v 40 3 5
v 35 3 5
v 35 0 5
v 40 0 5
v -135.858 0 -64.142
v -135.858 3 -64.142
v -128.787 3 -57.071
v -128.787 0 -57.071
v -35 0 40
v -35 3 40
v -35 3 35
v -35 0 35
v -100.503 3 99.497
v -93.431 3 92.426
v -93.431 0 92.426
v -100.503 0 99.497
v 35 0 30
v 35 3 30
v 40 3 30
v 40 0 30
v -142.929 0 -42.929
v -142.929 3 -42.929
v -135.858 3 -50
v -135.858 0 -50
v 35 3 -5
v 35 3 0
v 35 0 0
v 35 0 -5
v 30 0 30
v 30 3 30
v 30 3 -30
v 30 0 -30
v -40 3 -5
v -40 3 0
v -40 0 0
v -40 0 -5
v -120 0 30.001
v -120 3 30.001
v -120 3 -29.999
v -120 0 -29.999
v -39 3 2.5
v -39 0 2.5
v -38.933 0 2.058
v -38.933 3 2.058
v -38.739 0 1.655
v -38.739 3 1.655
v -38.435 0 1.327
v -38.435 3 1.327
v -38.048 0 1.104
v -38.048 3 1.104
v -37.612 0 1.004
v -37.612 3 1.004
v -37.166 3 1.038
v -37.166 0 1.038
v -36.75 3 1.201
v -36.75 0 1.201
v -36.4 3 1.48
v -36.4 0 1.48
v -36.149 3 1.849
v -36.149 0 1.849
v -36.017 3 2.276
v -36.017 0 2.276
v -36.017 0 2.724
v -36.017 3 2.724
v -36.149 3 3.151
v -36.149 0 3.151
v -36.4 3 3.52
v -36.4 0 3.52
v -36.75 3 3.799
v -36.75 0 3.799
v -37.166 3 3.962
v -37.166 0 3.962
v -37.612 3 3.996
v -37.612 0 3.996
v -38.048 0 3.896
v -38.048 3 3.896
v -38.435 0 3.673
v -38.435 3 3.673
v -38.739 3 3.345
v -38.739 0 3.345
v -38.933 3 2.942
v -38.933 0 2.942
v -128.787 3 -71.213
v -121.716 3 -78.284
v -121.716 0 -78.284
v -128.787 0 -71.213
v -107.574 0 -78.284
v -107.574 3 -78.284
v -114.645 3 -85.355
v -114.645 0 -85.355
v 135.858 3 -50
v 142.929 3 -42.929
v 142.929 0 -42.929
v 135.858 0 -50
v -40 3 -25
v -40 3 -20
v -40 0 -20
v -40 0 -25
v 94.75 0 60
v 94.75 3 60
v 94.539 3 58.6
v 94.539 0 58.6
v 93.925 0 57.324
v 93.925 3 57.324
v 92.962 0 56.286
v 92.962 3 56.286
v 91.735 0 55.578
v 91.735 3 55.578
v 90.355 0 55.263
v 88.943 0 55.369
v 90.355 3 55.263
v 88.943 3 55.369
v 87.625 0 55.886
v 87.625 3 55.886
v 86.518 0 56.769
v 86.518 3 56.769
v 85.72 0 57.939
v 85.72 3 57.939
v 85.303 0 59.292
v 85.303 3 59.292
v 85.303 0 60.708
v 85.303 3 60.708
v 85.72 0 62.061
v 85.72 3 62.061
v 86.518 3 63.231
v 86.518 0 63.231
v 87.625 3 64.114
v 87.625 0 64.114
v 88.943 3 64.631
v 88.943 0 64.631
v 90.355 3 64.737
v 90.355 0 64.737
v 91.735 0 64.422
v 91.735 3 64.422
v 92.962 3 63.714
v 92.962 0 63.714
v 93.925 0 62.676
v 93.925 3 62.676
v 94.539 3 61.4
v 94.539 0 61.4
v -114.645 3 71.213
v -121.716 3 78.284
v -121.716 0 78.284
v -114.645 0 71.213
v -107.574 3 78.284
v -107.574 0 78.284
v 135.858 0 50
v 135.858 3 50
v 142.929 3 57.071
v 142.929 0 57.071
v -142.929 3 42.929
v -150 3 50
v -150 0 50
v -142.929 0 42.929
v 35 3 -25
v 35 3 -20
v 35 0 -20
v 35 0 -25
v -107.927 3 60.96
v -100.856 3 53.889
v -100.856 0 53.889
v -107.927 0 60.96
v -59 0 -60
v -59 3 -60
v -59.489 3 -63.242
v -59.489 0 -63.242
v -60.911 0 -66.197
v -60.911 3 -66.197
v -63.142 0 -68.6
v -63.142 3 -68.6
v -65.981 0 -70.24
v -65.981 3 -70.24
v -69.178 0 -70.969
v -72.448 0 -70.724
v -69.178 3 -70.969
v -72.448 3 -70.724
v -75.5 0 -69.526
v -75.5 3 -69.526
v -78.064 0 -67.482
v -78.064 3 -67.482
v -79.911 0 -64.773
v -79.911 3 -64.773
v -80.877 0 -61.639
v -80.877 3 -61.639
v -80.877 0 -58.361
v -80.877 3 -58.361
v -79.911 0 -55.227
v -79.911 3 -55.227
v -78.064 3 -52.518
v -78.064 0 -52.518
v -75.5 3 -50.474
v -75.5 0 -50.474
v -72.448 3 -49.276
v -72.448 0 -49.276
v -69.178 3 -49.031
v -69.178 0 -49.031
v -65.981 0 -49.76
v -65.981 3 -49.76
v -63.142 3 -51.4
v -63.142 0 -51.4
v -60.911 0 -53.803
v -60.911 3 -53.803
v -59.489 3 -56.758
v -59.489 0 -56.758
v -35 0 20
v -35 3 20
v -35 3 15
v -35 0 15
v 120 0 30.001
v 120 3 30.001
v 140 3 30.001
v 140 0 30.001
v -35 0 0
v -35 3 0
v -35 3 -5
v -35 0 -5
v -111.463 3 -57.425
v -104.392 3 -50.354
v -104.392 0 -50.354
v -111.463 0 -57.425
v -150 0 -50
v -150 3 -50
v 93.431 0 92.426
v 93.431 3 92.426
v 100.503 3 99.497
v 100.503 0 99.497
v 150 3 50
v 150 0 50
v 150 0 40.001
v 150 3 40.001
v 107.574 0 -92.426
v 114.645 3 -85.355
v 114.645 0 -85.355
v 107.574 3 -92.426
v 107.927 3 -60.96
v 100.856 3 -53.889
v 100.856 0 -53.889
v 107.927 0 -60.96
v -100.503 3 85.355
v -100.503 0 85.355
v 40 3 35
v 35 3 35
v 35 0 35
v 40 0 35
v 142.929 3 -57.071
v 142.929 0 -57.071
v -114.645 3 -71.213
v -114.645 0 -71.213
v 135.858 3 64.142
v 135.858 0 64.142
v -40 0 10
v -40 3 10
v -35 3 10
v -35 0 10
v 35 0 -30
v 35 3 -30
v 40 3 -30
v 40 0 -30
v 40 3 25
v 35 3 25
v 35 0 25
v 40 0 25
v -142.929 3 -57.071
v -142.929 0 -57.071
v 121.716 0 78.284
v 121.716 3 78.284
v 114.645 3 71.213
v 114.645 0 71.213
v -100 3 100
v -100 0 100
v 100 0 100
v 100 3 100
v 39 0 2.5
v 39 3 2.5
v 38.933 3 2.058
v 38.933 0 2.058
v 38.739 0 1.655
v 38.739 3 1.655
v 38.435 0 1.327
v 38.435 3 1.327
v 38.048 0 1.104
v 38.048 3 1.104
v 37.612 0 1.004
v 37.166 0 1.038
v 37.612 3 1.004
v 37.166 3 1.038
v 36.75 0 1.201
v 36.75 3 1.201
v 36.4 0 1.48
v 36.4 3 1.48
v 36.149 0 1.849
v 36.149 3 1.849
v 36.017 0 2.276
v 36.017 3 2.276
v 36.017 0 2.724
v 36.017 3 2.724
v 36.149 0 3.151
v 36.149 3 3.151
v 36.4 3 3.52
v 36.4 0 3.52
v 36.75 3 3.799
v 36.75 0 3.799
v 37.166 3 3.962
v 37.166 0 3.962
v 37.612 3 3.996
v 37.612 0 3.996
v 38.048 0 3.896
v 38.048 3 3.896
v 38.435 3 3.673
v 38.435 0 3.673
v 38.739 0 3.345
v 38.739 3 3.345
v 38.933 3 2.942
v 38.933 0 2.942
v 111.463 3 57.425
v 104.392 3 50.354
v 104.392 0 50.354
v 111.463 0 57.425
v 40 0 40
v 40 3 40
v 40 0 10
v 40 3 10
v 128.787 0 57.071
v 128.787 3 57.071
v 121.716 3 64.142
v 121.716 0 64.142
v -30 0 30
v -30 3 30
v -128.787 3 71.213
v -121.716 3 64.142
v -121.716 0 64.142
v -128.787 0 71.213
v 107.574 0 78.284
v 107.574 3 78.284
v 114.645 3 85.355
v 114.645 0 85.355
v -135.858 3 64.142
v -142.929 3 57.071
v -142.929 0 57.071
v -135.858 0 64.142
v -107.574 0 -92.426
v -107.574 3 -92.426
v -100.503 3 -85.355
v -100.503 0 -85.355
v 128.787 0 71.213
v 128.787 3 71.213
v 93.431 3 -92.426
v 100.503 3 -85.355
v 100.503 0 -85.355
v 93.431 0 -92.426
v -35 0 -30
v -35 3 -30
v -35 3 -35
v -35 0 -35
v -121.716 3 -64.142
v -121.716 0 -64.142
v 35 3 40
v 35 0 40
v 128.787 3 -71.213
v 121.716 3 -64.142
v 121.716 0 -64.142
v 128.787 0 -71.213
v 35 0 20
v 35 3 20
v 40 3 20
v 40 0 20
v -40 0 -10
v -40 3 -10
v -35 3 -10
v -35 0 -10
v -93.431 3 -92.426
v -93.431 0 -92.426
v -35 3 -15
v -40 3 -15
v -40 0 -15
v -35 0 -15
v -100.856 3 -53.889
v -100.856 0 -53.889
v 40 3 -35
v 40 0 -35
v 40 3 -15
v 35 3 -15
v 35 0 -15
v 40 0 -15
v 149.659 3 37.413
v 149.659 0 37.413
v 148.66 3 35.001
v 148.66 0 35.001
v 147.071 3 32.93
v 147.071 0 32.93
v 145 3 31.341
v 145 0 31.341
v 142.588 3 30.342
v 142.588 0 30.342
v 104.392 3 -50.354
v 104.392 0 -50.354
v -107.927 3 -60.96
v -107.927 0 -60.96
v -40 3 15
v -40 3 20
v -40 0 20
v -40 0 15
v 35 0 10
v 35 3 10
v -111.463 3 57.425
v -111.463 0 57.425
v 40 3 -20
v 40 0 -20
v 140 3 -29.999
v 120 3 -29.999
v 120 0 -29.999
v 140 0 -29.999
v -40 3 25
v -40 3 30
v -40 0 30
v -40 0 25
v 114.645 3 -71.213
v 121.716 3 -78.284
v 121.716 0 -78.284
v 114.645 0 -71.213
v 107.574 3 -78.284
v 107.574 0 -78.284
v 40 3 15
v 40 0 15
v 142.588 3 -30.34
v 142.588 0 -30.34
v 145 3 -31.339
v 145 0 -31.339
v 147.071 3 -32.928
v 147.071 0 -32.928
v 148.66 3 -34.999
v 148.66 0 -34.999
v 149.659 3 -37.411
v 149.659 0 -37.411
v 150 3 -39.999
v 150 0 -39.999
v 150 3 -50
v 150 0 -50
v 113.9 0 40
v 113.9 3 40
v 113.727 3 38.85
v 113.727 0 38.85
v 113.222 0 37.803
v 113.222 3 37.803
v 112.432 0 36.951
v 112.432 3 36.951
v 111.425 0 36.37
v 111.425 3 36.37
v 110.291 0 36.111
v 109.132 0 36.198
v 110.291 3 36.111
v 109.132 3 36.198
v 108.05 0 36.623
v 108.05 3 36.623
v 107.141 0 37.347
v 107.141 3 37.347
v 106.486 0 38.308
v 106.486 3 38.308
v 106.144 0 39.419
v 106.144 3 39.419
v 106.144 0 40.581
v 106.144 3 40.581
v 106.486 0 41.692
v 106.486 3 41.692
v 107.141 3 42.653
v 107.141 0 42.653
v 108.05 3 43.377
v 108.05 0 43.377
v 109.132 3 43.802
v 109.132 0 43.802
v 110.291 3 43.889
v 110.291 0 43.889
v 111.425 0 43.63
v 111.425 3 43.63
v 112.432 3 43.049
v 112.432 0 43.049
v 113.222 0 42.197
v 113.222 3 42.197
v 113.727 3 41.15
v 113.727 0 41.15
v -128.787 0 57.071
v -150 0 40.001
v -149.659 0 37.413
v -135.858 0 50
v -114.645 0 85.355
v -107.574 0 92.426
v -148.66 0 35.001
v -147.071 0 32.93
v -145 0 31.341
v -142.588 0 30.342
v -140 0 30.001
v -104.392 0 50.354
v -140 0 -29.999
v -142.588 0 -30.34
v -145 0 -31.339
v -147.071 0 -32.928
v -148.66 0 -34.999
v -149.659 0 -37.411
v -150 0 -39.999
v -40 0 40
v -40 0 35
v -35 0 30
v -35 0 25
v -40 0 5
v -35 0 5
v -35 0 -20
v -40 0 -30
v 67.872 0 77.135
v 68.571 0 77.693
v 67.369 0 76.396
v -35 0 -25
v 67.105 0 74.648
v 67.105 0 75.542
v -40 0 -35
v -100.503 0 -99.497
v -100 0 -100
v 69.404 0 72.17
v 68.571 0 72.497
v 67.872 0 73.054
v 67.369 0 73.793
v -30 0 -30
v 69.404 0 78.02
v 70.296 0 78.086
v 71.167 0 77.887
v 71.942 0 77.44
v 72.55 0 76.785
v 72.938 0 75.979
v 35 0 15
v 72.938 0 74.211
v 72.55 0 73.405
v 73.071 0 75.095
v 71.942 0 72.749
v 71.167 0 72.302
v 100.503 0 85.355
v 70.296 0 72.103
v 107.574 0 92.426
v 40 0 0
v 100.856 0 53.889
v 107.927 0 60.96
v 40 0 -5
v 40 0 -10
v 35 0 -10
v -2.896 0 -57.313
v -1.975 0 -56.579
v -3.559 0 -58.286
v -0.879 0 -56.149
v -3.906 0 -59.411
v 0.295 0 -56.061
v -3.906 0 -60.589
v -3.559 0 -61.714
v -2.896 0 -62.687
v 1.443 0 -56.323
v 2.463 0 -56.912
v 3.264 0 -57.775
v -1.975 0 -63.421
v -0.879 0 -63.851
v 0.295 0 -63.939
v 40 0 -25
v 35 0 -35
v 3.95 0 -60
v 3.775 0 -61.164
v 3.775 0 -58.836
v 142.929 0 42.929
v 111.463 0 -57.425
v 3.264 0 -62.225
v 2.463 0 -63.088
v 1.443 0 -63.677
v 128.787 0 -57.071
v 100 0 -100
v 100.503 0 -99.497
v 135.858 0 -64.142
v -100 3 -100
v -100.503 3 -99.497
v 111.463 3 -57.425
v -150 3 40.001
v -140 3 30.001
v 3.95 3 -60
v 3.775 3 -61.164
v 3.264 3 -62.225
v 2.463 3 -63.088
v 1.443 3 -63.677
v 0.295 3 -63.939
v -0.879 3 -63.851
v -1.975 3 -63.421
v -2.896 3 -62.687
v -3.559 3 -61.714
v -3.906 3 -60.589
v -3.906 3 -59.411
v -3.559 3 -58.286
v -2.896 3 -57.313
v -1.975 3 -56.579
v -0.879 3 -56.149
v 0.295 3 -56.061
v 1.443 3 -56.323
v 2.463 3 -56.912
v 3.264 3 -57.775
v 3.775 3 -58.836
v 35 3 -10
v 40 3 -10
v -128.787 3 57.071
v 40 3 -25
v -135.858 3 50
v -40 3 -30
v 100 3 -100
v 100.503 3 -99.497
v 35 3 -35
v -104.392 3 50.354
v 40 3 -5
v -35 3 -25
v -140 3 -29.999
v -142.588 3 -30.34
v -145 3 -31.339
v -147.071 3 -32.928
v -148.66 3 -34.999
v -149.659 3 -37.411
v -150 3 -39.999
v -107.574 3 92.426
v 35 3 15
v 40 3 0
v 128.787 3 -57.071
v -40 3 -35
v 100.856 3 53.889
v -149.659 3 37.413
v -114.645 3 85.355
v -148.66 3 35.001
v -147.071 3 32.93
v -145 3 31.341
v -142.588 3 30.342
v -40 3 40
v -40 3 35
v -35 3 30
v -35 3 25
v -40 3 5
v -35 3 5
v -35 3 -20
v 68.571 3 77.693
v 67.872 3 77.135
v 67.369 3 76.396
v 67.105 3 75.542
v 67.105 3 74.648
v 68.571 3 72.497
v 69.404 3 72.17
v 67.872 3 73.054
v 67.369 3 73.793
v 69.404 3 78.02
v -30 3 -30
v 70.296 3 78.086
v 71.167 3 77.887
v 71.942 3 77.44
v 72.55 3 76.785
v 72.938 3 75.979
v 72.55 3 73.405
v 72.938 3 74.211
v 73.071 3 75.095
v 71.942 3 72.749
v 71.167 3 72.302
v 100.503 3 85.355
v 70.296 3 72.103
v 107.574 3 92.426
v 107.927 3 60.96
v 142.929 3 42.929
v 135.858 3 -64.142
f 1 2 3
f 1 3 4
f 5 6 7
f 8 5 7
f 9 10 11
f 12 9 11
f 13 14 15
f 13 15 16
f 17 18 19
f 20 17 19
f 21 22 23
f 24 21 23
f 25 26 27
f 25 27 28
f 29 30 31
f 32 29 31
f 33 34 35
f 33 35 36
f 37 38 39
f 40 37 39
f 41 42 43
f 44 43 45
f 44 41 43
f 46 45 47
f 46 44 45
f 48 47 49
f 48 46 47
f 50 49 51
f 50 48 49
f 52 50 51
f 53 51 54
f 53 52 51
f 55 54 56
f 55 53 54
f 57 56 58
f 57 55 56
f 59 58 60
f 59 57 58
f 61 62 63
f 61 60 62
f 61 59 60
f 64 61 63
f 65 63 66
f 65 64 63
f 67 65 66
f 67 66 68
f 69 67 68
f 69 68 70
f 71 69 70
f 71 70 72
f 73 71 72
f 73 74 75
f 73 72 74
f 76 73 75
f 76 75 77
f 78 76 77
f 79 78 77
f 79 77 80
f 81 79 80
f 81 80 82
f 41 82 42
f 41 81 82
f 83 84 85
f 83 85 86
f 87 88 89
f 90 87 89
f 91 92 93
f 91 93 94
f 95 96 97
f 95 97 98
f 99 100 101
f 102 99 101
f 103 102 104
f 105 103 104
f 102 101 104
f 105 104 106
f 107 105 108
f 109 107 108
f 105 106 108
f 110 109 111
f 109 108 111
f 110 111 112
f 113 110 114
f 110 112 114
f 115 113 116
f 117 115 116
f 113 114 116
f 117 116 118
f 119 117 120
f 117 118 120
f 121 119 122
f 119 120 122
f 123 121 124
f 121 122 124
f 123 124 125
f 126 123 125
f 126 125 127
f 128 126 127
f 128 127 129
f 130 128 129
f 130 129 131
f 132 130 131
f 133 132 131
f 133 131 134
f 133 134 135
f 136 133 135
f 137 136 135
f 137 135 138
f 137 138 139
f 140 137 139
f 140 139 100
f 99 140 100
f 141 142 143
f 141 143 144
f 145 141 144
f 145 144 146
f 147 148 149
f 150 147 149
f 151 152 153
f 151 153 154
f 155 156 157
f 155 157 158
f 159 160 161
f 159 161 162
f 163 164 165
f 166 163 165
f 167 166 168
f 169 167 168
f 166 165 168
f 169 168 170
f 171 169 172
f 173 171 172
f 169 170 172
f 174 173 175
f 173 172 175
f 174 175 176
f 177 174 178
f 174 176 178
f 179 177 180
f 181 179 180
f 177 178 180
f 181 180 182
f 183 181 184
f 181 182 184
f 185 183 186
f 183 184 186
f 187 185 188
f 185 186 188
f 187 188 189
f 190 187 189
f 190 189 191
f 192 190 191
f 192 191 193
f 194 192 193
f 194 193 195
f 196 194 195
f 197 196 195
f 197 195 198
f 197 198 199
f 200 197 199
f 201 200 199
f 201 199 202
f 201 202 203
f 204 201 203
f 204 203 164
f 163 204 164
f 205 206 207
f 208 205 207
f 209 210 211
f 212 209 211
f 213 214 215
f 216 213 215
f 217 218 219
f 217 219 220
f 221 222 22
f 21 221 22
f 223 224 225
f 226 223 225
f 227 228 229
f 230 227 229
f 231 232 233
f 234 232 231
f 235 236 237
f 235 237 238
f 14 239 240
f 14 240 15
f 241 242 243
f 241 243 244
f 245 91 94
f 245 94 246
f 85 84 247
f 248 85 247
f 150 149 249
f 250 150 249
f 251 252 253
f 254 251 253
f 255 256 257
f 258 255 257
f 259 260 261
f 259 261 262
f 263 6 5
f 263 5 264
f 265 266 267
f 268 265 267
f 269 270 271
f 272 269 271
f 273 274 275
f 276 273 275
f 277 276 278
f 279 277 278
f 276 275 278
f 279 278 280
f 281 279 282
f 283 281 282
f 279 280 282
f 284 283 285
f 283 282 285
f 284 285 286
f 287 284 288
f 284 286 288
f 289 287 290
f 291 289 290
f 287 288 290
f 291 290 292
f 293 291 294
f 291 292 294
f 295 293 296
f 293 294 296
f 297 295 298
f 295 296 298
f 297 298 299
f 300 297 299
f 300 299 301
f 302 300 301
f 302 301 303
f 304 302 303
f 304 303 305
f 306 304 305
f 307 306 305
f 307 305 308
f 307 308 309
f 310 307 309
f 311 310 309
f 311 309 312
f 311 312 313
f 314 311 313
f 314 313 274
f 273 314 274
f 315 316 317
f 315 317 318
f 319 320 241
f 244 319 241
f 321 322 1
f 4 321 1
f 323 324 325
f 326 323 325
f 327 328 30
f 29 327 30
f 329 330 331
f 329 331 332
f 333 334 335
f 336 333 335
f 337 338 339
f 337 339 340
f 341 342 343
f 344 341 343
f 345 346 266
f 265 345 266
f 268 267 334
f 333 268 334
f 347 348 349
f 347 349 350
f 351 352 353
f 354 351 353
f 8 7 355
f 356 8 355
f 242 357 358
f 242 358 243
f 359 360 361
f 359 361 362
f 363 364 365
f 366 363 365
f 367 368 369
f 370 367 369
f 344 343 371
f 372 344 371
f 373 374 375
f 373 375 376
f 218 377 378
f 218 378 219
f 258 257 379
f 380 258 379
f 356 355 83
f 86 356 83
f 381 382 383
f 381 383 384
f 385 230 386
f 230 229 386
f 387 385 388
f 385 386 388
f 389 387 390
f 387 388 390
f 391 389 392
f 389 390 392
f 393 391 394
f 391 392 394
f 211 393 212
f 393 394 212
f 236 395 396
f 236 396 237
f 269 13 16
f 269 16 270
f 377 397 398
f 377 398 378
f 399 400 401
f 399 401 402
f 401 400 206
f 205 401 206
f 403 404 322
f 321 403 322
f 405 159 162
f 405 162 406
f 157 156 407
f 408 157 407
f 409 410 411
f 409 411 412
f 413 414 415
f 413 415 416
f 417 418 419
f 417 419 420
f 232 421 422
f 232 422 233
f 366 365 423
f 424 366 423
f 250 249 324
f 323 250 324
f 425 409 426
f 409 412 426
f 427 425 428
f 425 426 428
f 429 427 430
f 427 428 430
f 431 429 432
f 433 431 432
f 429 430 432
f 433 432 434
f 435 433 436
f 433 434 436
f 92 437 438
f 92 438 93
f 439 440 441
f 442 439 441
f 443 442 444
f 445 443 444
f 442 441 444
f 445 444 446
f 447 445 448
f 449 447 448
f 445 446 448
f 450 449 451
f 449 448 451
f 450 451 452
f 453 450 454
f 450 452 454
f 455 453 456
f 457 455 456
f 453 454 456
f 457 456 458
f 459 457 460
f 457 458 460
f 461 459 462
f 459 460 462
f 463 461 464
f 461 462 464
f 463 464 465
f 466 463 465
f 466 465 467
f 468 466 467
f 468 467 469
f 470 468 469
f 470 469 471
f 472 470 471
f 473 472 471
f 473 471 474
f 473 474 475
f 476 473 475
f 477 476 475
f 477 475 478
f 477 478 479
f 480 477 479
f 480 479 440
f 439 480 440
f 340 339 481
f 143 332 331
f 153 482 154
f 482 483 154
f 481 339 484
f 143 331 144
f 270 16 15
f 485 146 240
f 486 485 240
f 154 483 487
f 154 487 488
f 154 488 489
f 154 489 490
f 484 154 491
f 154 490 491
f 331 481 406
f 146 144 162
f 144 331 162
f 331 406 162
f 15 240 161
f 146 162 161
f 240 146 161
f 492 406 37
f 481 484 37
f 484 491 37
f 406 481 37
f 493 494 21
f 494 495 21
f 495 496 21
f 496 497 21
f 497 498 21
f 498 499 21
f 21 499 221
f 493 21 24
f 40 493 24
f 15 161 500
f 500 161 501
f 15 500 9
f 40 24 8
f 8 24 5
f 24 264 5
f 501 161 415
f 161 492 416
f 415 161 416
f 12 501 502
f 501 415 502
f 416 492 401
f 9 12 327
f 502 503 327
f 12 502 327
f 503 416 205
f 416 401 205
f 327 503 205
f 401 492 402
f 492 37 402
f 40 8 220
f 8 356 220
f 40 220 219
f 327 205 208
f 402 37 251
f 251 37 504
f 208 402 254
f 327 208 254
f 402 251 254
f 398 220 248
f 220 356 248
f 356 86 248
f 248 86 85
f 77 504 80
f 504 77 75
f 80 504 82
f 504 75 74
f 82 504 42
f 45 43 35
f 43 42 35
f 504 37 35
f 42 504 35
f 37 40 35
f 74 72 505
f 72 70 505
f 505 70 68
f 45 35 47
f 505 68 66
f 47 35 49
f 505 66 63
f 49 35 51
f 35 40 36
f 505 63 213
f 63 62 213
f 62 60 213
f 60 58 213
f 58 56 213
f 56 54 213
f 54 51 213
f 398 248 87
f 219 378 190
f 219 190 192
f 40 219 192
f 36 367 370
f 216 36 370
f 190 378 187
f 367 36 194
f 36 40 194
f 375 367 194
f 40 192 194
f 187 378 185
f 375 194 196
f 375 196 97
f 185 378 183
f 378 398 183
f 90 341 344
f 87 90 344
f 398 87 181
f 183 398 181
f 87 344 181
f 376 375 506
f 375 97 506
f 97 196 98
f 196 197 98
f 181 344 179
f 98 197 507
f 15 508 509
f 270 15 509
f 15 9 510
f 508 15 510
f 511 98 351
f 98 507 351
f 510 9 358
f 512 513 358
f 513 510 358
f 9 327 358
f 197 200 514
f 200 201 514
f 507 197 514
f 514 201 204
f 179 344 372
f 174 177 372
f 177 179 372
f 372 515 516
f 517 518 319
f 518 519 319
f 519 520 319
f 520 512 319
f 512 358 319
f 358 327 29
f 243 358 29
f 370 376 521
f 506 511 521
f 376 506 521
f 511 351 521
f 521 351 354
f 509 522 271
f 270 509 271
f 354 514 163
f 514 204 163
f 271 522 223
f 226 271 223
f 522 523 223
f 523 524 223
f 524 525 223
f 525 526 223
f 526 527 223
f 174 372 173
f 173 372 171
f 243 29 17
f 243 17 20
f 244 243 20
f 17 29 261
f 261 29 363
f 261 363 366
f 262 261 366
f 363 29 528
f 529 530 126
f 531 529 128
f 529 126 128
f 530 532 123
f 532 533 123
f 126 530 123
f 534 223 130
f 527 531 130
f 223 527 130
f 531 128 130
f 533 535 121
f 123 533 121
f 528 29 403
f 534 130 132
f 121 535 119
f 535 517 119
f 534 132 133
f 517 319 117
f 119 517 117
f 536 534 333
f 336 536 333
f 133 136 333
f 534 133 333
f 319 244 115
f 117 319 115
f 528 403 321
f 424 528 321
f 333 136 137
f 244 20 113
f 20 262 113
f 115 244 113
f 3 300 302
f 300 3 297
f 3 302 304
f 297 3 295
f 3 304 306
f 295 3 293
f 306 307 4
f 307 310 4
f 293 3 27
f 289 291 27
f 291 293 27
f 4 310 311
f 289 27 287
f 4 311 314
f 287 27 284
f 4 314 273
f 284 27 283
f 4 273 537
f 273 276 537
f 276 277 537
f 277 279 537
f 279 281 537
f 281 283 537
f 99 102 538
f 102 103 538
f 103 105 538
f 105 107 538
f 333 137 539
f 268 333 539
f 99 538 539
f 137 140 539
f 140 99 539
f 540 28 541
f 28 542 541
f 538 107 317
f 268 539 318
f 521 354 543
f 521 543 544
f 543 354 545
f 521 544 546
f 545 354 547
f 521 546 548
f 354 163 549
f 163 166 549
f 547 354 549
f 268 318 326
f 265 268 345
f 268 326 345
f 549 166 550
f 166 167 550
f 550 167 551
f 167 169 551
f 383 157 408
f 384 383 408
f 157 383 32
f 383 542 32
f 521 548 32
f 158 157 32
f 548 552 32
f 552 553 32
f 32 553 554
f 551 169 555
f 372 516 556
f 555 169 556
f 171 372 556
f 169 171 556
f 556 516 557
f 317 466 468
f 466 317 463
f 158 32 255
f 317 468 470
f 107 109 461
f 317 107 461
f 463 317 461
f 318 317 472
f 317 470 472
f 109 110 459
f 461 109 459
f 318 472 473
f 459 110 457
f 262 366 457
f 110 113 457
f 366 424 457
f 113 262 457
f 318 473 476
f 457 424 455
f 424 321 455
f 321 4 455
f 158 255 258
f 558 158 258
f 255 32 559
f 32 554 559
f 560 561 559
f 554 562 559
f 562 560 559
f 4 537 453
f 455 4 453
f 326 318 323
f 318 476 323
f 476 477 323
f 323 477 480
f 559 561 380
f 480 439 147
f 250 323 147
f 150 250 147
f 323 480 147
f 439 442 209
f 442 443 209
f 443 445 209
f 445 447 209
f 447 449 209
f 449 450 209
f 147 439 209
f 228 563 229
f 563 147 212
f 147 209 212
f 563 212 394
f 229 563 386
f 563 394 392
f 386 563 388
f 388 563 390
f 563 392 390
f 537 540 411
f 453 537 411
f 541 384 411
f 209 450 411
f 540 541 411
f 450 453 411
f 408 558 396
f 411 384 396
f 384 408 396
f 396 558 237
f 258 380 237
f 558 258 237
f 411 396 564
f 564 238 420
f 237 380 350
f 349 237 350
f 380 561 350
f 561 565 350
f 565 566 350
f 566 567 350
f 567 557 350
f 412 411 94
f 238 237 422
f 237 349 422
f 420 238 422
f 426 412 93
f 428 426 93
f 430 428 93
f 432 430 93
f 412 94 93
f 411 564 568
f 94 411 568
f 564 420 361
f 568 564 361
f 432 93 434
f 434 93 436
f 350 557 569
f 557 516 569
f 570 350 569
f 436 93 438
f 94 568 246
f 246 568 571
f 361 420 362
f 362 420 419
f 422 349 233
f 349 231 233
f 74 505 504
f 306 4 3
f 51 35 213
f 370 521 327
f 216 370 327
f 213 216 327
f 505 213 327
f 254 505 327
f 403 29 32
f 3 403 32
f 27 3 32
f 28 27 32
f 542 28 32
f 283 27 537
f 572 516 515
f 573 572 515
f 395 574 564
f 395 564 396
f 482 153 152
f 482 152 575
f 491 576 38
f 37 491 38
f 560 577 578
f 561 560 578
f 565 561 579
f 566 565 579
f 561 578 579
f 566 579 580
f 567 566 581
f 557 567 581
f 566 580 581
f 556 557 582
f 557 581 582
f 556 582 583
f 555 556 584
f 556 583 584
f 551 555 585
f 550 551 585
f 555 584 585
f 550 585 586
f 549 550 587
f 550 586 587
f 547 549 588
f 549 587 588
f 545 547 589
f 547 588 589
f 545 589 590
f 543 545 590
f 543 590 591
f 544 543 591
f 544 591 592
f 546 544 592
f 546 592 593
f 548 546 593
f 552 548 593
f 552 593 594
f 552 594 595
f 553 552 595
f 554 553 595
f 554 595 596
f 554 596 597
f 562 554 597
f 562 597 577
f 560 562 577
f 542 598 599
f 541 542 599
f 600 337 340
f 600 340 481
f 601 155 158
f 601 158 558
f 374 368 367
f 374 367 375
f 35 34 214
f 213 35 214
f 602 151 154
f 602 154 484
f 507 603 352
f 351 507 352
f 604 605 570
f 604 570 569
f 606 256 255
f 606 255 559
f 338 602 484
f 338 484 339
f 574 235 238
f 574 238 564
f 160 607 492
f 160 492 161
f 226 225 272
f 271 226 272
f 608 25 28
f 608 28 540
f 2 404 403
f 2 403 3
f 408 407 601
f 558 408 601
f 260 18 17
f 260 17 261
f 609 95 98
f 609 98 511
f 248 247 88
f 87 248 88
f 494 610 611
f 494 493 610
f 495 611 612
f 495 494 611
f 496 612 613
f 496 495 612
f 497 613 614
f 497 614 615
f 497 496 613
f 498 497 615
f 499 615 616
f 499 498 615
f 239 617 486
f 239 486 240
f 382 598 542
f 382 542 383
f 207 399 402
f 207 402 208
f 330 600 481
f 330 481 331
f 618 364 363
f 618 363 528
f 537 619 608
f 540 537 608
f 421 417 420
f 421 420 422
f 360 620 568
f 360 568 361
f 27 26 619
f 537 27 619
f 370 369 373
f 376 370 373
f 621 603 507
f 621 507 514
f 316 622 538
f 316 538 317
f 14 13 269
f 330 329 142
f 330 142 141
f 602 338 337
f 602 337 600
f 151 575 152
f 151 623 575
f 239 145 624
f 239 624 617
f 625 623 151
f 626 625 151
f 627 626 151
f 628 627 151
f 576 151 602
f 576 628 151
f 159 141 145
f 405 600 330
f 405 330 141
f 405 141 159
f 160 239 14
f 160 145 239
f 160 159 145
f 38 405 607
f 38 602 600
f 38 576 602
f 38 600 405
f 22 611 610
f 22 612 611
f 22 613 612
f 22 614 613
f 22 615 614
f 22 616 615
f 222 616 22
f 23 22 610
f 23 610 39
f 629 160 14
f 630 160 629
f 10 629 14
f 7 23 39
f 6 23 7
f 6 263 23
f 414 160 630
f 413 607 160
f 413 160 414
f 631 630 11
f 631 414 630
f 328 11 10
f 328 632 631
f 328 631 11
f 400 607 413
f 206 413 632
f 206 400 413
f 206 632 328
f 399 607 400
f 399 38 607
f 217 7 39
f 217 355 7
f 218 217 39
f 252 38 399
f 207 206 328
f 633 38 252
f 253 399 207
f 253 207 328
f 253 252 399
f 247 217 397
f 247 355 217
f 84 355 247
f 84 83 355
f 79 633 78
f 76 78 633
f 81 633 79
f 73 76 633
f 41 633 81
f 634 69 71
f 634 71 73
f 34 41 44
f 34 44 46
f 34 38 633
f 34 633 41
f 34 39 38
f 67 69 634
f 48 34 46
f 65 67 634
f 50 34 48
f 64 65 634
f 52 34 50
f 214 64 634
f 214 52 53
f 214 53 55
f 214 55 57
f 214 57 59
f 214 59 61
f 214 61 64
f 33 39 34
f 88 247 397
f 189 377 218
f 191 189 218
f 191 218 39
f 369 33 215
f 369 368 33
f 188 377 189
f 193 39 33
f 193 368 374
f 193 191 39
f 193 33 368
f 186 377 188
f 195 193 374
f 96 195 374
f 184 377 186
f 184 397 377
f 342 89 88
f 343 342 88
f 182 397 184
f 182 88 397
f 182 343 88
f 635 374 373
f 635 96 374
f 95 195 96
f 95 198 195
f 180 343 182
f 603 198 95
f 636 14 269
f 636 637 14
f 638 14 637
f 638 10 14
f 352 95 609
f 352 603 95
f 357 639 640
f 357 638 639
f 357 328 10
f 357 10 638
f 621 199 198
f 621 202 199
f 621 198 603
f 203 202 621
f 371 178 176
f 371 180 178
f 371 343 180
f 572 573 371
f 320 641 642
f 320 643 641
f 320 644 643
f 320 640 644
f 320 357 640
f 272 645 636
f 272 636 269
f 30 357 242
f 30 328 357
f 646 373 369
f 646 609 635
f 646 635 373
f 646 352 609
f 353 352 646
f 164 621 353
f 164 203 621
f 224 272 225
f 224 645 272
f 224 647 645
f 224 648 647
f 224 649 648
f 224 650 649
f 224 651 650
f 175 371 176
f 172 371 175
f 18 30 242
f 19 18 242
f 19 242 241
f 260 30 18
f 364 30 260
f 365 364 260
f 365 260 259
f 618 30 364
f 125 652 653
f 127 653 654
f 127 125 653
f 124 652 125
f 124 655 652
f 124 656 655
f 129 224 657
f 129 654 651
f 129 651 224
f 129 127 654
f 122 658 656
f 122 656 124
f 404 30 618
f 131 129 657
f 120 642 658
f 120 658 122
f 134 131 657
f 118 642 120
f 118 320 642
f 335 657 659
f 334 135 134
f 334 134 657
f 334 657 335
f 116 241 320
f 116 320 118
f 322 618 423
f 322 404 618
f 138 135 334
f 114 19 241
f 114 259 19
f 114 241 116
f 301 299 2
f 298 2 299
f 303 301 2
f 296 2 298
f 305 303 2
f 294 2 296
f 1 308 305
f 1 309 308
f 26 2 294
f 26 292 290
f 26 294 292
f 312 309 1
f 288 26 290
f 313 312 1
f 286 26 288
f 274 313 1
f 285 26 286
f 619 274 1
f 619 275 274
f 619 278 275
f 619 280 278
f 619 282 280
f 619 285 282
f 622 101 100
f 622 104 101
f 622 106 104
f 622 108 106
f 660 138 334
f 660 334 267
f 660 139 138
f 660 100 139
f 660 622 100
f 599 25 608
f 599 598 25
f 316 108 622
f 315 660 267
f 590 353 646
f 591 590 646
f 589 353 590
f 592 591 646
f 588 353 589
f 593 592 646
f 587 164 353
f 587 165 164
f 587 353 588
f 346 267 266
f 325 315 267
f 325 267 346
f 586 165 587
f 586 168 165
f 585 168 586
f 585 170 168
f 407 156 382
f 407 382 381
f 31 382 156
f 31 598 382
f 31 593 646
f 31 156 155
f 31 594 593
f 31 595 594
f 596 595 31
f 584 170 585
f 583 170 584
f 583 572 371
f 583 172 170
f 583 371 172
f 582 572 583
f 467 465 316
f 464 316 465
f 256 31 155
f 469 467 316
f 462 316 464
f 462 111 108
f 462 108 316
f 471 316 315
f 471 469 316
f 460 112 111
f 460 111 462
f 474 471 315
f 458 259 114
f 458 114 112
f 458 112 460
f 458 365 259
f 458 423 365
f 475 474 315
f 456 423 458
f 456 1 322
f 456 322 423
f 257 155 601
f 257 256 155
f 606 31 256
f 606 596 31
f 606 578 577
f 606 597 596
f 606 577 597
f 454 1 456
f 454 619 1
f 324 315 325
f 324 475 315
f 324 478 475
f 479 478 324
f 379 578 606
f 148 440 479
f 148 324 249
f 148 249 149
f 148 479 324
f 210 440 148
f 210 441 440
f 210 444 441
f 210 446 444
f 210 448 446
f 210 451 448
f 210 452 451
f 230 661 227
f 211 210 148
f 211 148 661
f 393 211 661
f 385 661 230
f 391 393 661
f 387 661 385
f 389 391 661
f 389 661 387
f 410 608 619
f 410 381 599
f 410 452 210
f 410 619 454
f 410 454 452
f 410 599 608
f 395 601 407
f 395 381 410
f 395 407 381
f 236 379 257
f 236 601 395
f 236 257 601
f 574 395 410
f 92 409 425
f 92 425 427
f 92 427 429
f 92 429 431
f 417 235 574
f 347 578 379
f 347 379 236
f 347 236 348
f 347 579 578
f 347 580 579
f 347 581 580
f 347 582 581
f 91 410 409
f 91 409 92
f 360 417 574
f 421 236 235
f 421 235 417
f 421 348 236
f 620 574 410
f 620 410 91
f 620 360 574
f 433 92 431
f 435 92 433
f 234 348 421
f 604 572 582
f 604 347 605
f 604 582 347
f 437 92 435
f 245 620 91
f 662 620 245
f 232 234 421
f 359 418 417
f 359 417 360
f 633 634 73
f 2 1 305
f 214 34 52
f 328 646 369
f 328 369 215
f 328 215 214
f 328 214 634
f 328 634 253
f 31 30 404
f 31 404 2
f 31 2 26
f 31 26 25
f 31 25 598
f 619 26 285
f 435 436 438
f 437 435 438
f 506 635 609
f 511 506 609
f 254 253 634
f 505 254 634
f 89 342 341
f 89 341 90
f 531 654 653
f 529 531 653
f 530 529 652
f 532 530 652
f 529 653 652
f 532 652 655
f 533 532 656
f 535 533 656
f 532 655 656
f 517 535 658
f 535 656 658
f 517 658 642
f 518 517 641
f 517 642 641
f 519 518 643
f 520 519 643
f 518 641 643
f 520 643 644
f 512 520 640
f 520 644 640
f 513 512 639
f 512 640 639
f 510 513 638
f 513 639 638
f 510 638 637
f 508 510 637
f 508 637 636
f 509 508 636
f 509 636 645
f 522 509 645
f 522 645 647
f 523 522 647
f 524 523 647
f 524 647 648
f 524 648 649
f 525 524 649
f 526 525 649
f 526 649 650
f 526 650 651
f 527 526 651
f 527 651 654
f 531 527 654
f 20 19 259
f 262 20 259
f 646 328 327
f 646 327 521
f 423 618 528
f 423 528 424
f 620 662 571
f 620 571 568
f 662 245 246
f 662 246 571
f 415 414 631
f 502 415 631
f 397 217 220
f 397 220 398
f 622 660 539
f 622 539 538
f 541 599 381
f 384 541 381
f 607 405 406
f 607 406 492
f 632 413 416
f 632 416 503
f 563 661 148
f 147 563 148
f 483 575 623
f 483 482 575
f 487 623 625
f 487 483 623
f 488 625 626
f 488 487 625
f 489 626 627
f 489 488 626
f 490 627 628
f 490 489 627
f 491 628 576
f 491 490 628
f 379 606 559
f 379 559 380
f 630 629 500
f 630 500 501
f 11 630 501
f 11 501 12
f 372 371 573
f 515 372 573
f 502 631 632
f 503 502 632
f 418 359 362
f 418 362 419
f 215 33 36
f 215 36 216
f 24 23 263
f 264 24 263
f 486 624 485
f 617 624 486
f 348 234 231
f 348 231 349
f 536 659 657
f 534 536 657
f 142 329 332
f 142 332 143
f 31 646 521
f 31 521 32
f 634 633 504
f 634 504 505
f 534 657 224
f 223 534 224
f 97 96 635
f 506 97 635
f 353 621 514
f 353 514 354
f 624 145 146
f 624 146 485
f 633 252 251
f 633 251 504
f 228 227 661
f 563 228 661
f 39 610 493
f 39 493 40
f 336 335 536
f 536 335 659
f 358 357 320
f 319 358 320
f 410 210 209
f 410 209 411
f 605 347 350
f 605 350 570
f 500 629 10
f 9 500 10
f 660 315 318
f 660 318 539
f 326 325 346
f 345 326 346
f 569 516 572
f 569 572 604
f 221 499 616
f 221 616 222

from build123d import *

# Parameters (mm, degrees)
ESQUISSE1_W                     = 300
ESQUISSE1_H                     = 200
BOSS_EXTRU_1_DEPTH              = 3
ENL_V_MAT_EXTRU_1_DEPTH         = 10
ESQUISSE3_W                     = 5
ESQUISSE3_H                     = 5
ENL_V_MAT_EXTRU_2_DEPTH         = 10
R_P_TITION_LIN_AIRE1_COUNT      = 2
R_P_TITION_LIN_AIRE1_PITCH      = 75
R_P_TITION_LIN_AIRE1_COUNT_DIR2 = 8
R_P_TITION_LIN_AIRE1_PITCH_DIR2 = 10
ENL_V_MAT_EXTRU_5_DEPTH         = 10
R_P_TITION_LIN_AIRE2_COUNT      = 4
R_P_TITION_LIN_AIRE2_PITCH      = 20
SYM_TRIE1_COPY_1_DEPTH          = 10
SYM_TRIE1_COPY_2_DEPTH          = 10
SYM_TRIE1_COPY_3_DEPTH          = 10
ESQUISSE9_R                     = 1.5
ENL_V_MAT_EXTRU_8_DEPTH         = 10
SYM_TRIE2_COPY_1_DEPTH          = 10
SYM_TRIE2_COPY_2_DEPTH          = 10
SYM_TRIE2_COPY_3_DEPTH          = 10
SYM_TRIE2_COPY_4_DEPTH          = 10
SYM_TRIE2_COPY_5_DEPTH          = 10
SYM_TRIE2_COPY_6_DEPTH          = 10
SYM_TRIE2_COPY_7_DEPTH          = 10
ESQUISSE11_R                    = 11
ESQUISSE11_R_2                  = 3.9
ESQUISSE11_R_3                  = 4.75
ESQUISSE11_R_4                  = 3
ESQUISSE11_R_5                  = 3.95
ENL_V_MAT_EXTRU_10_DEPTH        = 10
ESQUISSE12_W                    = 60
ESQUISSE12_H                    = 60
ENL_V_MAT_EXTRU_11_DEPTH        = 10
ESQUISSE13_W                    = 30
ESQUISSE13_H                    = 60
ENL_V_MAT_EXTRU_12_DEPTH        = 10
ENL_V_MAT_EXTRU_14_DEPTH        = 10
CONG_1_R                        = 10


with BuildPart() as part:
    # Esquisse1 → Boss.-Extru.1 (new body)
    with BuildSketch(Plane(origin=(0, 0, 0), x_dir=(1, 0, 0), z_dir=(0, 1, 0))):
        Rectangle(ESQUISSE1_W, ESQUISSE1_H)
    extrude(amount=BOSS_EXTRU_1_DEPTH)

    # Esquisse2 → Enlèv. mat.-Extru.1 (cut)
    with BuildSketch(Plane(origin=(0, 3, 0), x_dir=(1, 0, 0), z_dir=(0, 1, 0))):
        Polygon((-100, 100), (-150, 50), (-150, 100), align=None)
        Polygon((150, 100), (150, 50), (100, 100), align=None)
        Polygon((150, -100), (150, -50), (100, -100), align=None)
        Polygon((-100, -100), (-150, -100), (-150, -50), align=None)
    extrude(amount=-ENL_V_MAT_EXTRU_1_DEPTH, mode=Mode.SUBTRACT)

    # Esquisse3 → Enlèv. mat.-Extru.2 (cut)
    with BuildSketch(Plane(origin=(0, 3, 0), x_dir=(1, 0, 0), z_dir=(0, 1, 0))):
        with Locations((37.5, -37.5)):
            Rectangle(ESQUISSE3_W, ESQUISSE3_H)
    enl_v_mat_extru_2 = extrude(amount=-ENL_V_MAT_EXTRU_2_DEPTH, mode=Mode.SUBTRACT)

    # Répétition linéaire1: Enl_v. mat.-Extru.2 2 × 8
    with Locations(*[(-i * R_P_TITION_LIN_AIRE1_PITCH, 0, -j * R_P_TITION_LIN_AIRE1_PITCH_DIR2) for i in range(R_P_TITION_LIN_AIRE1_COUNT) for j in range(R_P_TITION_LIN_AIRE1_COUNT_DIR2) if (i, j) != (0, 0)]):
        add(enl_v_mat_extru_2, mode=Mode.SUBTRACT)

    # Esquisse6 → Enlèv. mat.-Extru.5 (cut)
    with BuildSketch(Plane(origin=(0, 3, 0), x_dir=(1, 0, 0), z_dir=(0, 1, 0))):
        Polygon((-142.928932188, 57.071067812), (-150, 50), (-142.928932188, 42.928932188), (-135.857864376, 50), align=None)
    enl_v_mat_extru_5 = extrude(amount=-ENL_V_MAT_EXTRU_5_DEPTH, mode=Mode.SUBTRACT)

    # Répétition linéaire2: Enlèv. mat.-Extru.5 ×4
    with Locations(*[Vector(0.707106781, 0, -0.707106781) * (i * R_P_TITION_LIN_AIRE2_PITCH) for i in range(1, R_P_TITION_LIN_AIRE2_COUNT)]):
        add(enl_v_mat_extru_5, mode=Mode.SUBTRACT)

    # Symétrie1: Enlèv. mat.-Extru.5 across plane
    add(enl_v_mat_extru_5.mirror(Plane.XY), mode=Mode.SUBTRACT)

    # Symétrie1 copy 1 sketch → Symétrie1 copy 1 (cut)
    with BuildSketch(Plane(origin=(14.142135624, 3, 14.142135624), x_dir=(1, 0, 0), z_dir=(0, 1, 0))):
        Polygon((-142.928932188, -57.071067812), (-150, -50), (-142.928932188, -42.928932188), (-135.857864376, -50), align=None)
    extrude(amount=-SYM_TRIE1_COPY_1_DEPTH, mode=Mode.SUBTRACT)

    # Symétrie1 copy 2 sketch → Symétrie1 copy 2 (cut)
    with BuildSketch(Plane(origin=(28.284271247, 3, 28.284271247), x_dir=(1, 0, 0), z_dir=(0, 1, 0))):
        Polygon((-142.928932188, -57.071067812), (-150, -50), (-142.928932188, -42.928932188), (-135.857864376, -50), align=None)
    extrude(amount=-SYM_TRIE1_COPY_2_DEPTH, mode=Mode.SUBTRACT)

    # Symétrie1 copy 3 sketch → Symétrie1 copy 3 (cut)
    with BuildSketch(Plane(origin=(42.426406871, 3, 42.426406871), x_dir=(1, 0, 0), z_dir=(0, 1, 0))):
        Polygon((-142.928932188, -57.071067812), (-150, -50), (-142.928932188, -42.928932188), (-135.857864376, -50), align=None)
    extrude(amount=-SYM_TRIE1_COPY_3_DEPTH, mode=Mode.SUBTRACT)

    # Esquisse9 → Enlèv. mat.-Extru.8 (cut)
    with BuildSketch(Plane(origin=(0, 3, 0), x_dir=(1, 0, 0), z_dir=(0, 1, 0))):
        with Locations((37.5, -2.5)):
            Circle(ESQUISSE9_R)
    enl_v_mat_extru_8 = extrude(amount=-ENL_V_MAT_EXTRU_8_DEPTH, mode=Mode.SUBTRACT)

    # Symétrie2: Enlèv. mat.-Extru.8, Enlèv. mat.-Extru.5 across plane
    add(enl_v_mat_extru_8.mirror(Plane(origin=(0, 0, 0), x_dir=(0, 0, 1), z_dir=(1, 0, 0))), mode=Mode.SUBTRACT)
    add(enl_v_mat_extru_5.mirror(Plane(origin=(0, 0, 0), x_dir=(0, 0, 1), z_dir=(1, 0, 0))), mode=Mode.SUBTRACT)

    # Symétrie2 copy 1 sketch → Symétrie2 copy 1 (cut)
    with BuildSketch(Plane(origin=(0, 3, 0), x_dir=(-1, 0, 0), z_dir=(0, 1, 0))):
        Polygon((-142.928932188, 57.071067812), (-150, 50), (-142.928932188, 42.928932188), (-135.857864376, 50), align=None)
    extrude(amount=-SYM_TRIE2_COPY_1_DEPTH, mode=Mode.SUBTRACT)

    # Symétrie2 copy 2 sketch → Symétrie2 copy 2 (cut)
    with BuildSketch(Plane(origin=(-14.142135624, 3, 14.142135624), x_dir=(-1, 0, 0), z_dir=(0, 1, 0))):
        Polygon((-142.928932188, 57.071067812), (-150, 50), (-142.928932188, 42.928932188), (-135.857864376, 50), align=None)
    extrude(amount=-SYM_TRIE2_COPY_2_DEPTH, mode=Mode.SUBTRACT)

    # Symétrie2 copy 3 sketch → Symétrie2 copy 3 (cut)
    with BuildSketch(Plane(origin=(-28.284271247, 3, 28.284271247), x_dir=(-1, 0, 0), z_dir=(0, 1, 0))):
        Polygon((-142.928932188, 57.071067812), (-150, 50), (-142.928932188, 42.928932188), (-135.857864376, 50), align=None)
    extrude(amount=-SYM_TRIE2_COPY_3_DEPTH, mode=Mode.SUBTRACT)

    # Symétrie2 copy 4 sketch → Symétrie2 copy 4 (cut)
    with BuildSketch(Plane(origin=(-42.426406871, 3, 42.426406871), x_dir=(-1, 0, 0), z_dir=(0, 1, 0))):
        Polygon((-142.928932188, 57.071067812), (-150, 50), (-142.928932188, 42.928932188), (-135.857864376, 50), align=None)
    extrude(amount=-SYM_TRIE2_COPY_4_DEPTH, mode=Mode.SUBTRACT)

    # Symétrie2 copy 5 sketch → Symétrie2 copy 5 (cut)
    with BuildSketch(Plane(origin=(-14.142135624, 3, -14.142135624), x_dir=(-1, 0, 0), z_dir=(0, 1, 0))):
        Polygon((-142.928932188, -57.071067812), (-150, -50), (-142.928932188, -42.928932188), (-135.857864376, -50), align=None)
    extrude(amount=-SYM_TRIE2_COPY_5_DEPTH, mode=Mode.SUBTRACT)

    # Symétrie2 copy 6 sketch → Symétrie2 copy 6 (cut)
    with BuildSketch(Plane(origin=(-28.284271247, 3, -28.284271247), x_dir=(-1, 0, 0), z_dir=(0, 1, 0))):
        Polygon((-142.928932188, -57.071067812), (-150, -50), (-142.928932188, -42.928932188), (-135.857864376, -50), align=None)
    extrude(amount=-SYM_TRIE2_COPY_6_DEPTH, mode=Mode.SUBTRACT)

    # Symétrie2 copy 7 sketch → Symétrie2 copy 7 (cut)
    with BuildSketch(Plane(origin=(-42.426406871, 3, -42.426406871), x_dir=(-1, 0, 0), z_dir=(0, 1, 0))):
        Polygon((-142.928932188, -57.071067812), (-150, -50), (-142.928932188, -42.928932188), (-135.857864376, -50), align=None)
    extrude(amount=-SYM_TRIE2_COPY_7_DEPTH, mode=Mode.SUBTRACT)

    # Esquisse11 → Enlèv. mat.-Extru.10 (cut)
    with BuildSketch(Plane(origin=(0, 3, 0), x_dir=(1, 0, 0), z_dir=(0, 1, 0))):
        with Locations((-70, 60)):
            Circle(ESQUISSE11_R)
        with Locations((110, -40)):
            Circle(ESQUISSE11_R_2)
        with Locations((90, -60)):
            Circle(ESQUISSE11_R_3)
        with Locations((70.071466061, -75.094818152)):
            Circle(ESQUISSE11_R_4)
        with Locations((0, 60)):
            Circle(ESQUISSE11_R_5)
    extrude(amount=-ENL_V_MAT_EXTRU_10_DEPTH, mode=Mode.SUBTRACT)

    # Esquisse12 → Enlèv. mat.-Extru.11 (cut)
    with BuildSketch(Plane(origin=(0, 3, 0), x_dir=(1, 0, 0), z_dir=(0, 1, 0))):
        Rectangle(ESQUISSE12_W, ESQUISSE12_H)
    extrude(amount=-ENL_V_MAT_EXTRU_11_DEPTH, mode=Mode.SUBTRACT)

    # Esquisse13 → Enlèv. mat.-Extru.12 (cut)
    with BuildSketch(Plane(origin=(0, 3, 0), x_dir=(1, 0, 0), z_dir=(0, 1, 0))):
        with Locations((-135, -0.001067812)):
            Rectangle(ESQUISSE13_W, ESQUISSE13_H)
        with Locations((135, -0.001067812)):
            Rectangle(ESQUISSE13_W, ESQUISSE13_H)
    extrude(amount=-ENL_V_MAT_EXTRU_12_DEPTH, mode=Mode.SUBTRACT)

    # Esquisse15 → Enlèv. mat.-Extru.14 (cut)
    with BuildSketch(Plane(origin=(0, 3, 0), x_dir=(1, 0, 0), z_dir=(0, 1, 0))):
        Polygon((-111.462680425, -57.424621202), (-104.391612613, -50.353553391), (-100.856078708, -53.889087297), (-107.927146519, -60.960155108), align=None)
        Polygon((107.927146519, -60.960155108), (100.856078708, -53.889087297), (104.391612613, -50.353553391), (111.462680425, -57.424621202), align=None)
        Polygon((111.462680425, 57.424621202), (104.391612613, 50.353553391), (100.856078708, 53.889087297), (107.927146519, 60.960155108), align=None)
        Polygon((-107.927146519, 60.960155108), (-100.856078708, 53.889087297), (-104.391612613, 50.353553391), (-111.462680425, 57.424621202), align=None)
    extrude(amount=-ENL_V_MAT_EXTRU_14_DEPTH, mode=Mode.SUBTRACT)

    # Congé1
    cong_1_edges = [part.edges().sort_by_distance(p)[0] for p in [
        (-150, 1.5, 30.001067812),
        (-150, 1.5, -29.998932188),
        (150, 1.5, 30.001067812),
        (150, 1.5, -29.998932188),
    ]]
    fillet(cong_1_edges, radius=CONG_1_R)


solid = part.part
